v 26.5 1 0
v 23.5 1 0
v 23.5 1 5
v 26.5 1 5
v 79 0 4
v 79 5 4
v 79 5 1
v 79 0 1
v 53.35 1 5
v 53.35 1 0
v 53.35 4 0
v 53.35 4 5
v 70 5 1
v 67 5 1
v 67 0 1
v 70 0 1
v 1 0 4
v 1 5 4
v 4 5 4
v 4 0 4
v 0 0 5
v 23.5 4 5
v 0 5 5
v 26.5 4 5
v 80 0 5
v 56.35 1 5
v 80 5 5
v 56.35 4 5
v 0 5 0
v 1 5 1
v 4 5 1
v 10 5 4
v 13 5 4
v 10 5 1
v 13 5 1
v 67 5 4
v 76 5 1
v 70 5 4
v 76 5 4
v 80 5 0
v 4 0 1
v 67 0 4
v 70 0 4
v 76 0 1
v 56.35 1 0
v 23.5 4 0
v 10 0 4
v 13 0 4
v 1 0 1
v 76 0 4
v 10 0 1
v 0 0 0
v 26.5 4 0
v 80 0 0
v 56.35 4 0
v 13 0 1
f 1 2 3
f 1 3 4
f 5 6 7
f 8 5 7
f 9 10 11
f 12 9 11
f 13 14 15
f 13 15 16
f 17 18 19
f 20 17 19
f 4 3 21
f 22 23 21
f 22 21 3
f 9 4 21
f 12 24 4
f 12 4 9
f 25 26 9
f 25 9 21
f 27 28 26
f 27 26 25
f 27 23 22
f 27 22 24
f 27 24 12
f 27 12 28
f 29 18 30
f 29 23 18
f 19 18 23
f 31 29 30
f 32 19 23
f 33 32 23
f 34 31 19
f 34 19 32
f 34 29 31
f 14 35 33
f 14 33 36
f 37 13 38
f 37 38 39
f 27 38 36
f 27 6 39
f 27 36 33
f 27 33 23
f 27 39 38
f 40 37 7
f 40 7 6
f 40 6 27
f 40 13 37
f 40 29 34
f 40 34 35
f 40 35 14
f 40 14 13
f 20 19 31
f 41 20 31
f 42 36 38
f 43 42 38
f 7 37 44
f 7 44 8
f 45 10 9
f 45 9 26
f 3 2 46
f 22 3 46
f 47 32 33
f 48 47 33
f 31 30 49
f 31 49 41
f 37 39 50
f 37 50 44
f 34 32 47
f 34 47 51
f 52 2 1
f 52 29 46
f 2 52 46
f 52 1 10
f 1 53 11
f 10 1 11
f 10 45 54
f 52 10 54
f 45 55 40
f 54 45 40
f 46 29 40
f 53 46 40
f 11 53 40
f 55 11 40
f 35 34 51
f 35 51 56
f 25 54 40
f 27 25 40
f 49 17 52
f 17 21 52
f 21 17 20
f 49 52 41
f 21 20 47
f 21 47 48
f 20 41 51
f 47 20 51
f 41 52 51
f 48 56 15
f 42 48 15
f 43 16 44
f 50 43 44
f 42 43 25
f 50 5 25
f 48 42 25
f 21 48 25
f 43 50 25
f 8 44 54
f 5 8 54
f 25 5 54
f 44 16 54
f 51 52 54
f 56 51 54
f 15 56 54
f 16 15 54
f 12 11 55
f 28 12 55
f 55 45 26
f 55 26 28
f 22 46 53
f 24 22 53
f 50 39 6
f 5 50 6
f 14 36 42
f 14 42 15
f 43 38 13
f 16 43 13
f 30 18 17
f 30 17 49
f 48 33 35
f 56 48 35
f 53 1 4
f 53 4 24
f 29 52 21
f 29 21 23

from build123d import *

# Parameters (mm, degrees)
SKETCH1_W           = 80
SKETCH1_H           = 5
SKETCH1_W_2         = 3
SKETCH1_H_2         = 3
BOSS_EXTRUDE1_DEPTH = 5
SKETCH2_W           = 3
SKETCH2_H           = 3
CUT_EXTRUDE1_DEPTH  = 5


with BuildPart() as part:
    # Sketch1 → Boss-Extrude1 (new body)
    with BuildSketch(Plane.XY):
        with Locations((40, 2.5)):
            Rectangle(SKETCH1_W, SKETCH1_H)
        with Locations((54.85, 2.5)):
            Rectangle(SKETCH1_W_2, SKETCH1_H_2, mode=Mode.SUBTRACT)
        with Locations((25, 2.5)):
            Rectangle(SKETCH1_W_2, SKETCH1_H_2, mode=Mode.SUBTRACT)
    extrude(amount=BOSS_EXTRUDE1_DEPTH)

    # Sketch2 → Cut-Extrude1 (cut)
    with BuildSketch(Plane(origin=(0, 5, 0), x_dir=(1, 0, 0), z_dir=(0, 1, 0))):
        with Locations((77.5, -2.5)):
            Rectangle(SKETCH2_W, SKETCH2_H)
        with Locations((2.5, -2.5)):
            Rectangle(SKETCH2_W, SKETCH2_H)
        with Locations((11.5, -2.5)):
            Rectangle(SKETCH2_W, SKETCH2_H)
        with Locations((68.5, -2.5)):
            Rectangle(SKETCH2_W, SKETCH2_H)
    extrude(amount=-CUT_EXTRUDE1_DEPTH, mode=Mode.SUBTRACT)


solid = part.part
